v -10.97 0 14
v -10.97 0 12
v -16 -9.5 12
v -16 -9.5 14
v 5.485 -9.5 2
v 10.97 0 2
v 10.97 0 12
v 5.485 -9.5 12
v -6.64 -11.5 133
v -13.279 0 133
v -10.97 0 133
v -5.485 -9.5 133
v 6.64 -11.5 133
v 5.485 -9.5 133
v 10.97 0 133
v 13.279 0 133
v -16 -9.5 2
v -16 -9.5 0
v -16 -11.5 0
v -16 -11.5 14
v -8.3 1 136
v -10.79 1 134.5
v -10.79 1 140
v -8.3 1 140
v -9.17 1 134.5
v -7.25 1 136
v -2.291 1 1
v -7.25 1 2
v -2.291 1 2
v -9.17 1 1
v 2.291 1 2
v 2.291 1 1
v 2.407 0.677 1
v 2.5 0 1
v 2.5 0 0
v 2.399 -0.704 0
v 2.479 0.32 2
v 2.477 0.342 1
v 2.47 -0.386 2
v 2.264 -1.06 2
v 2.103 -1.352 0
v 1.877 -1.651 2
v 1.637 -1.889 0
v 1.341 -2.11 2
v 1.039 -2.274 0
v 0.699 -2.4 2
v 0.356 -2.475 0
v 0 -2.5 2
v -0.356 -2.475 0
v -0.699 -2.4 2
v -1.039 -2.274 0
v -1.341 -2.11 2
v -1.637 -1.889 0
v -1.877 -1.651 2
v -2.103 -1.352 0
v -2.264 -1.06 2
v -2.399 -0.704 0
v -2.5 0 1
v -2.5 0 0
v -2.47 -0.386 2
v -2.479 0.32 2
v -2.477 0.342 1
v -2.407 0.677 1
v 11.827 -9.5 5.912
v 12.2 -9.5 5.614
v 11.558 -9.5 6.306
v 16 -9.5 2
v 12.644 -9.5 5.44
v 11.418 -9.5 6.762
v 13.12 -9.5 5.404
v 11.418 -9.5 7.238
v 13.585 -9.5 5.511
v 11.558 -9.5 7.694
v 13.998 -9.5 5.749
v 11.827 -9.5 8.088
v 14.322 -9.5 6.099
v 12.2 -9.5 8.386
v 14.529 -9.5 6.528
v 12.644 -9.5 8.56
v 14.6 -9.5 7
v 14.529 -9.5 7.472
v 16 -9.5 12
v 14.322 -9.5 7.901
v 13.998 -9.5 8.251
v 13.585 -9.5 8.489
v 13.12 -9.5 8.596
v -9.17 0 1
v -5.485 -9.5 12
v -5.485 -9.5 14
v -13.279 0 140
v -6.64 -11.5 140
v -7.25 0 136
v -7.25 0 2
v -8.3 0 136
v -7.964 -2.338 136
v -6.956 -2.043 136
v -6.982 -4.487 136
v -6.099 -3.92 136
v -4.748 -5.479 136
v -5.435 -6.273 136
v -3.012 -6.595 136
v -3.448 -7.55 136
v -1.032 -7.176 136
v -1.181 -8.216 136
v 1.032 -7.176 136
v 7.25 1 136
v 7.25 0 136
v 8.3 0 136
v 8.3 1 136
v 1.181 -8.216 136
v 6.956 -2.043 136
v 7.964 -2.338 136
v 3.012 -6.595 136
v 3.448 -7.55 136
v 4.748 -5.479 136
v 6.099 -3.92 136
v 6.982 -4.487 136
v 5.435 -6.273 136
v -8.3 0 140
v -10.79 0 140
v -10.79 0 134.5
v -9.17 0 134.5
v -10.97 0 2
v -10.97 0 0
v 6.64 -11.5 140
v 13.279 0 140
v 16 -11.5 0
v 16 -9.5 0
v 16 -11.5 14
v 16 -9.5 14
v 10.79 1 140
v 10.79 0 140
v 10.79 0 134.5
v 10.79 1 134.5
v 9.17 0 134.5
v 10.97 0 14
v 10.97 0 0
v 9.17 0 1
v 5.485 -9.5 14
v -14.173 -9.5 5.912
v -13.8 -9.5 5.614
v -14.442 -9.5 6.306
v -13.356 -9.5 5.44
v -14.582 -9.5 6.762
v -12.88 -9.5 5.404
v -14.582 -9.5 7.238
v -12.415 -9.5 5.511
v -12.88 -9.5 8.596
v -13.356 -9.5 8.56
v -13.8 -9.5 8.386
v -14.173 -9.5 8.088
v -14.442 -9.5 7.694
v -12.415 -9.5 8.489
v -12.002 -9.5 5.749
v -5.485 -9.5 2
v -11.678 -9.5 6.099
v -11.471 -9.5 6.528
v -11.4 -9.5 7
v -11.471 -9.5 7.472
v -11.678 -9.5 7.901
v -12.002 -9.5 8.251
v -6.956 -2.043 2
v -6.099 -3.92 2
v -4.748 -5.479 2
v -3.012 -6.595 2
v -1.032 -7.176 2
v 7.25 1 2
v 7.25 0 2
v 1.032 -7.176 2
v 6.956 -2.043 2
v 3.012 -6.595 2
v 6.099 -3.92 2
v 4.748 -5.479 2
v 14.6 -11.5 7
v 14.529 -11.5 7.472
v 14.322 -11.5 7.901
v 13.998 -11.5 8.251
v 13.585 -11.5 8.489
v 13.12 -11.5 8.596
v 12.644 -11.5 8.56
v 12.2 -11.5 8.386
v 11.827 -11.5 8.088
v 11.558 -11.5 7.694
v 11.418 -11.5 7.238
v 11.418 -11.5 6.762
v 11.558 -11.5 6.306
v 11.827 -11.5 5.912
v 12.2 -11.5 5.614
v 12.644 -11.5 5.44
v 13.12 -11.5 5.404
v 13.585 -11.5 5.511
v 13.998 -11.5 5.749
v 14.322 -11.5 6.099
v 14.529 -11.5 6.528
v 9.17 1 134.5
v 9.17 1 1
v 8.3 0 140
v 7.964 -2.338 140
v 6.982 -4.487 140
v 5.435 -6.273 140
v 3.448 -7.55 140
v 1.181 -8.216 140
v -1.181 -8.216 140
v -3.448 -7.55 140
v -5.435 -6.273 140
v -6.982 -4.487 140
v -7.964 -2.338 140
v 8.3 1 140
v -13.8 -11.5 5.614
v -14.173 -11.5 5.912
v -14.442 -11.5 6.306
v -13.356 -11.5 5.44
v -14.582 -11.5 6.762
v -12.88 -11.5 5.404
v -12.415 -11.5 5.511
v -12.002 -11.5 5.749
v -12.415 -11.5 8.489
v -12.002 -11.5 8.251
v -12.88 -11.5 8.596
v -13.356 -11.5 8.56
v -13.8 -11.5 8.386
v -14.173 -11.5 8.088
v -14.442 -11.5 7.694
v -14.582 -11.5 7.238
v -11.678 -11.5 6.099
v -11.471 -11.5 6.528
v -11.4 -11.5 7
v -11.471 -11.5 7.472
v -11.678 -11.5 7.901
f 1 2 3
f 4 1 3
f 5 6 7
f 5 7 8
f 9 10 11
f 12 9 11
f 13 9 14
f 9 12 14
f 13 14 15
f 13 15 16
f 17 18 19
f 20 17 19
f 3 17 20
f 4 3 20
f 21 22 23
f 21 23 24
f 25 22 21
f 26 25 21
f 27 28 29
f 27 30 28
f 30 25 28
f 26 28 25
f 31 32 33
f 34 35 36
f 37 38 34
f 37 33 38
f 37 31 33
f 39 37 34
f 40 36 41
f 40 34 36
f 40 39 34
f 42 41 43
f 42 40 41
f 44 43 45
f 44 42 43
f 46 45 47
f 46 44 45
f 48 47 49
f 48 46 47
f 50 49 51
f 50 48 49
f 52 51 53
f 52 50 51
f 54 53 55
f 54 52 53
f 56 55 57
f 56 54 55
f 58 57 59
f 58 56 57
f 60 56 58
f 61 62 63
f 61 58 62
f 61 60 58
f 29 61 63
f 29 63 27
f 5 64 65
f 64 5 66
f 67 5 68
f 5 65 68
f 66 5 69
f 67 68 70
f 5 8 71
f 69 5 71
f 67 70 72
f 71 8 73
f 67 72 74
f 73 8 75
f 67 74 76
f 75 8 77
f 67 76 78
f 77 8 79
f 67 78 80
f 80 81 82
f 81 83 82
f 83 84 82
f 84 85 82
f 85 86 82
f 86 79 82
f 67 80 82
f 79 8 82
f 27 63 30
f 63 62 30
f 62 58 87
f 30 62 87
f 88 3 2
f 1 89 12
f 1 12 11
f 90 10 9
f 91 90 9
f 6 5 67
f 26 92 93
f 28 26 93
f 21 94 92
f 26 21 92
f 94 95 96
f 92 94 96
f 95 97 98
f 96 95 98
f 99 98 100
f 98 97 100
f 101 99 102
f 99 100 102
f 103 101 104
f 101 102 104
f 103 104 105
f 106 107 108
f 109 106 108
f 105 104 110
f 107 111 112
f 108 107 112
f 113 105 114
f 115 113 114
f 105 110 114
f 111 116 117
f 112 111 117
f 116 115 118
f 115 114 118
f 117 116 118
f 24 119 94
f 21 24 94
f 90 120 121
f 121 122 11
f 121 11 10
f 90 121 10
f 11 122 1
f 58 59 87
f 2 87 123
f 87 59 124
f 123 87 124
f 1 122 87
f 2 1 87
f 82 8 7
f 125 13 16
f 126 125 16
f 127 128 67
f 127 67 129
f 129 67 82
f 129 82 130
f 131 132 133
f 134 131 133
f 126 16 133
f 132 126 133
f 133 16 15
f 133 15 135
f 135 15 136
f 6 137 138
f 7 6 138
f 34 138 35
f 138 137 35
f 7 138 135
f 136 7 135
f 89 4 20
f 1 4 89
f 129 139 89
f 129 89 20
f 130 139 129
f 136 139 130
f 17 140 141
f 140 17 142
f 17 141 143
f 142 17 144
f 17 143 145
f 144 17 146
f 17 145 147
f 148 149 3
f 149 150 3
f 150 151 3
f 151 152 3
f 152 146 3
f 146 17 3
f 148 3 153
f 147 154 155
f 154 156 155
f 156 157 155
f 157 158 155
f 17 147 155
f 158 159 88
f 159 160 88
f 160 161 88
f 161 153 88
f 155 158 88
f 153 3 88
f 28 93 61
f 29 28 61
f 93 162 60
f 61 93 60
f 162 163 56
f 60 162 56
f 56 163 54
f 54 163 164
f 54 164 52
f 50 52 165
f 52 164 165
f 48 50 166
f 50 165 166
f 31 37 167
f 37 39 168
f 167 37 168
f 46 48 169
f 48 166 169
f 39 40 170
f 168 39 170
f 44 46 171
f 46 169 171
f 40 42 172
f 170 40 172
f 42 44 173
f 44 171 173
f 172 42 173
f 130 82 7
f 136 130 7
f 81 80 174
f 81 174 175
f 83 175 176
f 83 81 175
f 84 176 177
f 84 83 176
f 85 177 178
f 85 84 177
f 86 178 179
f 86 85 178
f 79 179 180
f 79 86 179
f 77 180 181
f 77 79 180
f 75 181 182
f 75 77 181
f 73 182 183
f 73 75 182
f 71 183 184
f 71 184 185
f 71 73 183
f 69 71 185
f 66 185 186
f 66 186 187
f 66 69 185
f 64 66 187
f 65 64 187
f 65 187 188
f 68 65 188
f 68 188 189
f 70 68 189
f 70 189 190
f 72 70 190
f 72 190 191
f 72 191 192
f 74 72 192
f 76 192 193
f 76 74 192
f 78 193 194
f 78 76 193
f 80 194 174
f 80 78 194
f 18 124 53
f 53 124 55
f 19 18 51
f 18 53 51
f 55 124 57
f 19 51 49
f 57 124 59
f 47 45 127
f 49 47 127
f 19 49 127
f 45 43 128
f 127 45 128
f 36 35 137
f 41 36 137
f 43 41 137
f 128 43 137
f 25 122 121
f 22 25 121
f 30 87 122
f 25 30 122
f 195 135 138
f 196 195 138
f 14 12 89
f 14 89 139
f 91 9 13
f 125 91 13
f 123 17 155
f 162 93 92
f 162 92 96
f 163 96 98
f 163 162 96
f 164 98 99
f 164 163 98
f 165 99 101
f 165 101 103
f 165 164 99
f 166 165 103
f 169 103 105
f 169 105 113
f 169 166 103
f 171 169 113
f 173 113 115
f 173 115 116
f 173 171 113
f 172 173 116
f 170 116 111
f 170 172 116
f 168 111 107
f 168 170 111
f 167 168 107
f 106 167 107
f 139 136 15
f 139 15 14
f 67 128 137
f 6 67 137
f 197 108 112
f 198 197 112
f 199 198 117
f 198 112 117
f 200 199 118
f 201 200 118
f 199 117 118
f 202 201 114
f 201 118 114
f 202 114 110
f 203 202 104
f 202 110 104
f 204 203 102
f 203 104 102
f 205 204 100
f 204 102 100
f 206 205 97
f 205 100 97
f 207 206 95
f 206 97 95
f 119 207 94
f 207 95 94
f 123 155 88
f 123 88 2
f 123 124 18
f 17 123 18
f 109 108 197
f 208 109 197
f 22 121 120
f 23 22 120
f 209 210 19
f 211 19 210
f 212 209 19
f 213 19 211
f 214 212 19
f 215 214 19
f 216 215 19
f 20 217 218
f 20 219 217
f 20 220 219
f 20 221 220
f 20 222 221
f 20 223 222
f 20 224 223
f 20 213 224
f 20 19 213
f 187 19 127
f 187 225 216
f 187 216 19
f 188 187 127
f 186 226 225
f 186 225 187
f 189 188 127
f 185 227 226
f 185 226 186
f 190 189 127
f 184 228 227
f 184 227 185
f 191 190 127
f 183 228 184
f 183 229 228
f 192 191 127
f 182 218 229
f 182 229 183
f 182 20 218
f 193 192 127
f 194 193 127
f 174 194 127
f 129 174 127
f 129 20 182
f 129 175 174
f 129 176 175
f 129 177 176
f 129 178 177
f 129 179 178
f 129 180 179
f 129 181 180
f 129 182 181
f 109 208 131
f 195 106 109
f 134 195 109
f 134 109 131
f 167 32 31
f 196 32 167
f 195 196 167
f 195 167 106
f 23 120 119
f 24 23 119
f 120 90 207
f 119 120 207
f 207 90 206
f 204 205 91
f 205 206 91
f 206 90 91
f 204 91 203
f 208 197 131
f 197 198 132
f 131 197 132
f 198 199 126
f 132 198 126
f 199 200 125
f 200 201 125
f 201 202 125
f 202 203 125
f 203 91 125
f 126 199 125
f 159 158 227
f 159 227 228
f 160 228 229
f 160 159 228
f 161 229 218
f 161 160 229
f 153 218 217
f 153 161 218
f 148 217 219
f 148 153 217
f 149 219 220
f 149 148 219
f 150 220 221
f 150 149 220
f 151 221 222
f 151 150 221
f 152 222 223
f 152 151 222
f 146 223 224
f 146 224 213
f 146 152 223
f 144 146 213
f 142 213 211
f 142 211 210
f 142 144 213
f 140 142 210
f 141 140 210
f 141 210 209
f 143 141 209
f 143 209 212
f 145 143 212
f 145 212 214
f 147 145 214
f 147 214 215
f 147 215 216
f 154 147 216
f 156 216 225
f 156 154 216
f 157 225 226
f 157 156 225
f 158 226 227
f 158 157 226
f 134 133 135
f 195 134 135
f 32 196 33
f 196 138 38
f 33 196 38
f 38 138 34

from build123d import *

# Parameters (mm, degrees)
AUFSATZ_LINEAR_AUSTRAGEN1_DEPTH  = 136
AUFSATZ_LINEAR_AUSTRAGEN2_DEPTH  = 2
AUFSATZ_LINEAR_AUSTRAGEN3_DEPTH  = 7
AUFSATZ_LINEAR_AUSTRAGEN6_DEPTH  = 2
LINEARES_MUSTER3_COUNT           = 2
LINEARES_MUSTER3_PITCH           = 12
SKIZZE12_W                       = 32
SKIZZE12_H                       = 14
SKIZZE12_R                       = 1.6
AUFSATZ_LINEAR_AUSTRAGEN14_DEPTH = 2
AUFSATZ_LINEAR_AUSTRAGEN15_DEPTH = 1
SCHNITT_LINEAR_START             = -2
SKIZZE14_R                       = 2.5
SCHNITT_LINEAR_AUSTRAGEN1_DEPTH  = 2


with BuildPart() as part:
    # Skizze1 → Aufsatz-Linear austragen1 (new body)
    with BuildSketch(Plane.XY):
        with BuildLine():
            Line((7.25, 0), (10.969655115, 0))
            Line((10.969655115, 0), (5.484827557, -9.5))
            Line((5.484827557, -9.5), (-5.484827557, -9.5))
            Line((-5.484827557, -9.5), (-10.969655115, 0))
            Line((-10.969655115, 0), (-7.25, 0))
            ThreePointArc((-7.25, 0), (0, -7.25), (7.25, 0))
        make_face()
    extrude(amount=AUFSATZ_LINEAR_AUSTRAGEN1_DEPTH)

    # Skizze2 → Aufsatz-Linear austragen2 (add)
    with BuildSketch(Plane.XY):
        with BuildLine():
            Line((7.25, 0), (-7.25, 0))
            ThreePointArc((-7.25, 0), (0, -7.25), (7.25, 0))
        make_face()
    extrude(amount=AUFSATZ_LINEAR_AUSTRAGEN2_DEPTH)

    # Skizze3 → Aufsatz-Linear austragen3 (add)
    with BuildSketch(Plane.XY.offset(133)):
        with BuildLine():
            Line((-8.3, 0), (-13.279056191, 0))
            Line((-13.279056191, 0), (-6.639528096, -11.5))
            Line((-6.639528096, -11.5), (6.639528096, -11.5))
            Line((6.639528096, -11.5), (13.279056191, 0))
            Line((13.279056191, 0), (8.3, 0))
            ThreePointArc((8.3, 0), (0, -8.3), (-8.3, 0))
        make_face()
    extrude(amount=AUFSATZ_LINEAR_AUSTRAGEN3_DEPTH)

    # Skizze7 → Aufsatz-Linear austragen6 (add)
    with BuildSketch(Plane.XY):
        Polygon((10.969655115, 0), (5.484827557, -9.5), (16, -9.5), align=None)
        Polygon((-5.484827557, -9.5), (-10.969655115, 0), (-16, -9.5), align=None)
    aufsatz_linear_austragen6 = extrude(amount=AUFSATZ_LINEAR_AUSTRAGEN6_DEPTH)

    # Lineares Muster3: Aufsatz-Linear austragen6 ×2
    with Locations(*[(0, 0, i * LINEARES_MUSTER3_PITCH) for i in range(1, LINEARES_MUSTER3_COUNT)]):
        add(aufsatz_linear_austragen6)

    # Skizze12 → Aufsatz-Linear austragen14 (add)
    with BuildSketch(Plane.XZ.offset(9.5)):
        with Locations((0, 7)):
            Rectangle(SKIZZE12_W, SKIZZE12_H)
        with Locations((-13, 7)):
            Circle(SKIZZE12_R, mode=Mode.SUBTRACT)
        with Locations((13, 7)):
            Circle(SKIZZE12_R, mode=Mode.SUBTRACT)
    extrude(amount=AUFSATZ_LINEAR_AUSTRAGEN14_DEPTH)

    # Skizze13 → Aufsatz-Linear austragen15 (add)
    with BuildSketch(Plane(origin=(0, 0, 0), x_dir=(1, 0, 0), z_dir=(0, 1, 0))):
        Polygon((8.3, -140), (10.789528096, -140), (10.789528096, -134.5), (9.169655115, -134.5), (9.169655115, -1), (-9.169655115, -1), (-9.169655115, -134.5), (-10.789528096, -134.5), (-10.789528096, -140), (-8.3, -140), (-8.3, -136), (-7.25, -136), (-7.25, -2), (7.25, -2), (7.25, -136), (8.3, -136), align=None)
    extrude(amount=AUFSATZ_LINEAR_AUSTRAGEN15_DEPTH)

    # Skizze14 → Schnitt-Linear austragen1 (cut)
    with BuildSketch(Plane(origin=(0, 0, 0), x_dir=(-1, 0, 0), z_dir=(0, 0, -1)).offset(SCHNITT_LINEAR_START)):
        Circle(SKIZZE14_R)
    extrude(amount=SCHNITT_LINEAR_AUSTRAGEN1_DEPTH, mode=Mode.SUBTRACT)


solid = part.part
